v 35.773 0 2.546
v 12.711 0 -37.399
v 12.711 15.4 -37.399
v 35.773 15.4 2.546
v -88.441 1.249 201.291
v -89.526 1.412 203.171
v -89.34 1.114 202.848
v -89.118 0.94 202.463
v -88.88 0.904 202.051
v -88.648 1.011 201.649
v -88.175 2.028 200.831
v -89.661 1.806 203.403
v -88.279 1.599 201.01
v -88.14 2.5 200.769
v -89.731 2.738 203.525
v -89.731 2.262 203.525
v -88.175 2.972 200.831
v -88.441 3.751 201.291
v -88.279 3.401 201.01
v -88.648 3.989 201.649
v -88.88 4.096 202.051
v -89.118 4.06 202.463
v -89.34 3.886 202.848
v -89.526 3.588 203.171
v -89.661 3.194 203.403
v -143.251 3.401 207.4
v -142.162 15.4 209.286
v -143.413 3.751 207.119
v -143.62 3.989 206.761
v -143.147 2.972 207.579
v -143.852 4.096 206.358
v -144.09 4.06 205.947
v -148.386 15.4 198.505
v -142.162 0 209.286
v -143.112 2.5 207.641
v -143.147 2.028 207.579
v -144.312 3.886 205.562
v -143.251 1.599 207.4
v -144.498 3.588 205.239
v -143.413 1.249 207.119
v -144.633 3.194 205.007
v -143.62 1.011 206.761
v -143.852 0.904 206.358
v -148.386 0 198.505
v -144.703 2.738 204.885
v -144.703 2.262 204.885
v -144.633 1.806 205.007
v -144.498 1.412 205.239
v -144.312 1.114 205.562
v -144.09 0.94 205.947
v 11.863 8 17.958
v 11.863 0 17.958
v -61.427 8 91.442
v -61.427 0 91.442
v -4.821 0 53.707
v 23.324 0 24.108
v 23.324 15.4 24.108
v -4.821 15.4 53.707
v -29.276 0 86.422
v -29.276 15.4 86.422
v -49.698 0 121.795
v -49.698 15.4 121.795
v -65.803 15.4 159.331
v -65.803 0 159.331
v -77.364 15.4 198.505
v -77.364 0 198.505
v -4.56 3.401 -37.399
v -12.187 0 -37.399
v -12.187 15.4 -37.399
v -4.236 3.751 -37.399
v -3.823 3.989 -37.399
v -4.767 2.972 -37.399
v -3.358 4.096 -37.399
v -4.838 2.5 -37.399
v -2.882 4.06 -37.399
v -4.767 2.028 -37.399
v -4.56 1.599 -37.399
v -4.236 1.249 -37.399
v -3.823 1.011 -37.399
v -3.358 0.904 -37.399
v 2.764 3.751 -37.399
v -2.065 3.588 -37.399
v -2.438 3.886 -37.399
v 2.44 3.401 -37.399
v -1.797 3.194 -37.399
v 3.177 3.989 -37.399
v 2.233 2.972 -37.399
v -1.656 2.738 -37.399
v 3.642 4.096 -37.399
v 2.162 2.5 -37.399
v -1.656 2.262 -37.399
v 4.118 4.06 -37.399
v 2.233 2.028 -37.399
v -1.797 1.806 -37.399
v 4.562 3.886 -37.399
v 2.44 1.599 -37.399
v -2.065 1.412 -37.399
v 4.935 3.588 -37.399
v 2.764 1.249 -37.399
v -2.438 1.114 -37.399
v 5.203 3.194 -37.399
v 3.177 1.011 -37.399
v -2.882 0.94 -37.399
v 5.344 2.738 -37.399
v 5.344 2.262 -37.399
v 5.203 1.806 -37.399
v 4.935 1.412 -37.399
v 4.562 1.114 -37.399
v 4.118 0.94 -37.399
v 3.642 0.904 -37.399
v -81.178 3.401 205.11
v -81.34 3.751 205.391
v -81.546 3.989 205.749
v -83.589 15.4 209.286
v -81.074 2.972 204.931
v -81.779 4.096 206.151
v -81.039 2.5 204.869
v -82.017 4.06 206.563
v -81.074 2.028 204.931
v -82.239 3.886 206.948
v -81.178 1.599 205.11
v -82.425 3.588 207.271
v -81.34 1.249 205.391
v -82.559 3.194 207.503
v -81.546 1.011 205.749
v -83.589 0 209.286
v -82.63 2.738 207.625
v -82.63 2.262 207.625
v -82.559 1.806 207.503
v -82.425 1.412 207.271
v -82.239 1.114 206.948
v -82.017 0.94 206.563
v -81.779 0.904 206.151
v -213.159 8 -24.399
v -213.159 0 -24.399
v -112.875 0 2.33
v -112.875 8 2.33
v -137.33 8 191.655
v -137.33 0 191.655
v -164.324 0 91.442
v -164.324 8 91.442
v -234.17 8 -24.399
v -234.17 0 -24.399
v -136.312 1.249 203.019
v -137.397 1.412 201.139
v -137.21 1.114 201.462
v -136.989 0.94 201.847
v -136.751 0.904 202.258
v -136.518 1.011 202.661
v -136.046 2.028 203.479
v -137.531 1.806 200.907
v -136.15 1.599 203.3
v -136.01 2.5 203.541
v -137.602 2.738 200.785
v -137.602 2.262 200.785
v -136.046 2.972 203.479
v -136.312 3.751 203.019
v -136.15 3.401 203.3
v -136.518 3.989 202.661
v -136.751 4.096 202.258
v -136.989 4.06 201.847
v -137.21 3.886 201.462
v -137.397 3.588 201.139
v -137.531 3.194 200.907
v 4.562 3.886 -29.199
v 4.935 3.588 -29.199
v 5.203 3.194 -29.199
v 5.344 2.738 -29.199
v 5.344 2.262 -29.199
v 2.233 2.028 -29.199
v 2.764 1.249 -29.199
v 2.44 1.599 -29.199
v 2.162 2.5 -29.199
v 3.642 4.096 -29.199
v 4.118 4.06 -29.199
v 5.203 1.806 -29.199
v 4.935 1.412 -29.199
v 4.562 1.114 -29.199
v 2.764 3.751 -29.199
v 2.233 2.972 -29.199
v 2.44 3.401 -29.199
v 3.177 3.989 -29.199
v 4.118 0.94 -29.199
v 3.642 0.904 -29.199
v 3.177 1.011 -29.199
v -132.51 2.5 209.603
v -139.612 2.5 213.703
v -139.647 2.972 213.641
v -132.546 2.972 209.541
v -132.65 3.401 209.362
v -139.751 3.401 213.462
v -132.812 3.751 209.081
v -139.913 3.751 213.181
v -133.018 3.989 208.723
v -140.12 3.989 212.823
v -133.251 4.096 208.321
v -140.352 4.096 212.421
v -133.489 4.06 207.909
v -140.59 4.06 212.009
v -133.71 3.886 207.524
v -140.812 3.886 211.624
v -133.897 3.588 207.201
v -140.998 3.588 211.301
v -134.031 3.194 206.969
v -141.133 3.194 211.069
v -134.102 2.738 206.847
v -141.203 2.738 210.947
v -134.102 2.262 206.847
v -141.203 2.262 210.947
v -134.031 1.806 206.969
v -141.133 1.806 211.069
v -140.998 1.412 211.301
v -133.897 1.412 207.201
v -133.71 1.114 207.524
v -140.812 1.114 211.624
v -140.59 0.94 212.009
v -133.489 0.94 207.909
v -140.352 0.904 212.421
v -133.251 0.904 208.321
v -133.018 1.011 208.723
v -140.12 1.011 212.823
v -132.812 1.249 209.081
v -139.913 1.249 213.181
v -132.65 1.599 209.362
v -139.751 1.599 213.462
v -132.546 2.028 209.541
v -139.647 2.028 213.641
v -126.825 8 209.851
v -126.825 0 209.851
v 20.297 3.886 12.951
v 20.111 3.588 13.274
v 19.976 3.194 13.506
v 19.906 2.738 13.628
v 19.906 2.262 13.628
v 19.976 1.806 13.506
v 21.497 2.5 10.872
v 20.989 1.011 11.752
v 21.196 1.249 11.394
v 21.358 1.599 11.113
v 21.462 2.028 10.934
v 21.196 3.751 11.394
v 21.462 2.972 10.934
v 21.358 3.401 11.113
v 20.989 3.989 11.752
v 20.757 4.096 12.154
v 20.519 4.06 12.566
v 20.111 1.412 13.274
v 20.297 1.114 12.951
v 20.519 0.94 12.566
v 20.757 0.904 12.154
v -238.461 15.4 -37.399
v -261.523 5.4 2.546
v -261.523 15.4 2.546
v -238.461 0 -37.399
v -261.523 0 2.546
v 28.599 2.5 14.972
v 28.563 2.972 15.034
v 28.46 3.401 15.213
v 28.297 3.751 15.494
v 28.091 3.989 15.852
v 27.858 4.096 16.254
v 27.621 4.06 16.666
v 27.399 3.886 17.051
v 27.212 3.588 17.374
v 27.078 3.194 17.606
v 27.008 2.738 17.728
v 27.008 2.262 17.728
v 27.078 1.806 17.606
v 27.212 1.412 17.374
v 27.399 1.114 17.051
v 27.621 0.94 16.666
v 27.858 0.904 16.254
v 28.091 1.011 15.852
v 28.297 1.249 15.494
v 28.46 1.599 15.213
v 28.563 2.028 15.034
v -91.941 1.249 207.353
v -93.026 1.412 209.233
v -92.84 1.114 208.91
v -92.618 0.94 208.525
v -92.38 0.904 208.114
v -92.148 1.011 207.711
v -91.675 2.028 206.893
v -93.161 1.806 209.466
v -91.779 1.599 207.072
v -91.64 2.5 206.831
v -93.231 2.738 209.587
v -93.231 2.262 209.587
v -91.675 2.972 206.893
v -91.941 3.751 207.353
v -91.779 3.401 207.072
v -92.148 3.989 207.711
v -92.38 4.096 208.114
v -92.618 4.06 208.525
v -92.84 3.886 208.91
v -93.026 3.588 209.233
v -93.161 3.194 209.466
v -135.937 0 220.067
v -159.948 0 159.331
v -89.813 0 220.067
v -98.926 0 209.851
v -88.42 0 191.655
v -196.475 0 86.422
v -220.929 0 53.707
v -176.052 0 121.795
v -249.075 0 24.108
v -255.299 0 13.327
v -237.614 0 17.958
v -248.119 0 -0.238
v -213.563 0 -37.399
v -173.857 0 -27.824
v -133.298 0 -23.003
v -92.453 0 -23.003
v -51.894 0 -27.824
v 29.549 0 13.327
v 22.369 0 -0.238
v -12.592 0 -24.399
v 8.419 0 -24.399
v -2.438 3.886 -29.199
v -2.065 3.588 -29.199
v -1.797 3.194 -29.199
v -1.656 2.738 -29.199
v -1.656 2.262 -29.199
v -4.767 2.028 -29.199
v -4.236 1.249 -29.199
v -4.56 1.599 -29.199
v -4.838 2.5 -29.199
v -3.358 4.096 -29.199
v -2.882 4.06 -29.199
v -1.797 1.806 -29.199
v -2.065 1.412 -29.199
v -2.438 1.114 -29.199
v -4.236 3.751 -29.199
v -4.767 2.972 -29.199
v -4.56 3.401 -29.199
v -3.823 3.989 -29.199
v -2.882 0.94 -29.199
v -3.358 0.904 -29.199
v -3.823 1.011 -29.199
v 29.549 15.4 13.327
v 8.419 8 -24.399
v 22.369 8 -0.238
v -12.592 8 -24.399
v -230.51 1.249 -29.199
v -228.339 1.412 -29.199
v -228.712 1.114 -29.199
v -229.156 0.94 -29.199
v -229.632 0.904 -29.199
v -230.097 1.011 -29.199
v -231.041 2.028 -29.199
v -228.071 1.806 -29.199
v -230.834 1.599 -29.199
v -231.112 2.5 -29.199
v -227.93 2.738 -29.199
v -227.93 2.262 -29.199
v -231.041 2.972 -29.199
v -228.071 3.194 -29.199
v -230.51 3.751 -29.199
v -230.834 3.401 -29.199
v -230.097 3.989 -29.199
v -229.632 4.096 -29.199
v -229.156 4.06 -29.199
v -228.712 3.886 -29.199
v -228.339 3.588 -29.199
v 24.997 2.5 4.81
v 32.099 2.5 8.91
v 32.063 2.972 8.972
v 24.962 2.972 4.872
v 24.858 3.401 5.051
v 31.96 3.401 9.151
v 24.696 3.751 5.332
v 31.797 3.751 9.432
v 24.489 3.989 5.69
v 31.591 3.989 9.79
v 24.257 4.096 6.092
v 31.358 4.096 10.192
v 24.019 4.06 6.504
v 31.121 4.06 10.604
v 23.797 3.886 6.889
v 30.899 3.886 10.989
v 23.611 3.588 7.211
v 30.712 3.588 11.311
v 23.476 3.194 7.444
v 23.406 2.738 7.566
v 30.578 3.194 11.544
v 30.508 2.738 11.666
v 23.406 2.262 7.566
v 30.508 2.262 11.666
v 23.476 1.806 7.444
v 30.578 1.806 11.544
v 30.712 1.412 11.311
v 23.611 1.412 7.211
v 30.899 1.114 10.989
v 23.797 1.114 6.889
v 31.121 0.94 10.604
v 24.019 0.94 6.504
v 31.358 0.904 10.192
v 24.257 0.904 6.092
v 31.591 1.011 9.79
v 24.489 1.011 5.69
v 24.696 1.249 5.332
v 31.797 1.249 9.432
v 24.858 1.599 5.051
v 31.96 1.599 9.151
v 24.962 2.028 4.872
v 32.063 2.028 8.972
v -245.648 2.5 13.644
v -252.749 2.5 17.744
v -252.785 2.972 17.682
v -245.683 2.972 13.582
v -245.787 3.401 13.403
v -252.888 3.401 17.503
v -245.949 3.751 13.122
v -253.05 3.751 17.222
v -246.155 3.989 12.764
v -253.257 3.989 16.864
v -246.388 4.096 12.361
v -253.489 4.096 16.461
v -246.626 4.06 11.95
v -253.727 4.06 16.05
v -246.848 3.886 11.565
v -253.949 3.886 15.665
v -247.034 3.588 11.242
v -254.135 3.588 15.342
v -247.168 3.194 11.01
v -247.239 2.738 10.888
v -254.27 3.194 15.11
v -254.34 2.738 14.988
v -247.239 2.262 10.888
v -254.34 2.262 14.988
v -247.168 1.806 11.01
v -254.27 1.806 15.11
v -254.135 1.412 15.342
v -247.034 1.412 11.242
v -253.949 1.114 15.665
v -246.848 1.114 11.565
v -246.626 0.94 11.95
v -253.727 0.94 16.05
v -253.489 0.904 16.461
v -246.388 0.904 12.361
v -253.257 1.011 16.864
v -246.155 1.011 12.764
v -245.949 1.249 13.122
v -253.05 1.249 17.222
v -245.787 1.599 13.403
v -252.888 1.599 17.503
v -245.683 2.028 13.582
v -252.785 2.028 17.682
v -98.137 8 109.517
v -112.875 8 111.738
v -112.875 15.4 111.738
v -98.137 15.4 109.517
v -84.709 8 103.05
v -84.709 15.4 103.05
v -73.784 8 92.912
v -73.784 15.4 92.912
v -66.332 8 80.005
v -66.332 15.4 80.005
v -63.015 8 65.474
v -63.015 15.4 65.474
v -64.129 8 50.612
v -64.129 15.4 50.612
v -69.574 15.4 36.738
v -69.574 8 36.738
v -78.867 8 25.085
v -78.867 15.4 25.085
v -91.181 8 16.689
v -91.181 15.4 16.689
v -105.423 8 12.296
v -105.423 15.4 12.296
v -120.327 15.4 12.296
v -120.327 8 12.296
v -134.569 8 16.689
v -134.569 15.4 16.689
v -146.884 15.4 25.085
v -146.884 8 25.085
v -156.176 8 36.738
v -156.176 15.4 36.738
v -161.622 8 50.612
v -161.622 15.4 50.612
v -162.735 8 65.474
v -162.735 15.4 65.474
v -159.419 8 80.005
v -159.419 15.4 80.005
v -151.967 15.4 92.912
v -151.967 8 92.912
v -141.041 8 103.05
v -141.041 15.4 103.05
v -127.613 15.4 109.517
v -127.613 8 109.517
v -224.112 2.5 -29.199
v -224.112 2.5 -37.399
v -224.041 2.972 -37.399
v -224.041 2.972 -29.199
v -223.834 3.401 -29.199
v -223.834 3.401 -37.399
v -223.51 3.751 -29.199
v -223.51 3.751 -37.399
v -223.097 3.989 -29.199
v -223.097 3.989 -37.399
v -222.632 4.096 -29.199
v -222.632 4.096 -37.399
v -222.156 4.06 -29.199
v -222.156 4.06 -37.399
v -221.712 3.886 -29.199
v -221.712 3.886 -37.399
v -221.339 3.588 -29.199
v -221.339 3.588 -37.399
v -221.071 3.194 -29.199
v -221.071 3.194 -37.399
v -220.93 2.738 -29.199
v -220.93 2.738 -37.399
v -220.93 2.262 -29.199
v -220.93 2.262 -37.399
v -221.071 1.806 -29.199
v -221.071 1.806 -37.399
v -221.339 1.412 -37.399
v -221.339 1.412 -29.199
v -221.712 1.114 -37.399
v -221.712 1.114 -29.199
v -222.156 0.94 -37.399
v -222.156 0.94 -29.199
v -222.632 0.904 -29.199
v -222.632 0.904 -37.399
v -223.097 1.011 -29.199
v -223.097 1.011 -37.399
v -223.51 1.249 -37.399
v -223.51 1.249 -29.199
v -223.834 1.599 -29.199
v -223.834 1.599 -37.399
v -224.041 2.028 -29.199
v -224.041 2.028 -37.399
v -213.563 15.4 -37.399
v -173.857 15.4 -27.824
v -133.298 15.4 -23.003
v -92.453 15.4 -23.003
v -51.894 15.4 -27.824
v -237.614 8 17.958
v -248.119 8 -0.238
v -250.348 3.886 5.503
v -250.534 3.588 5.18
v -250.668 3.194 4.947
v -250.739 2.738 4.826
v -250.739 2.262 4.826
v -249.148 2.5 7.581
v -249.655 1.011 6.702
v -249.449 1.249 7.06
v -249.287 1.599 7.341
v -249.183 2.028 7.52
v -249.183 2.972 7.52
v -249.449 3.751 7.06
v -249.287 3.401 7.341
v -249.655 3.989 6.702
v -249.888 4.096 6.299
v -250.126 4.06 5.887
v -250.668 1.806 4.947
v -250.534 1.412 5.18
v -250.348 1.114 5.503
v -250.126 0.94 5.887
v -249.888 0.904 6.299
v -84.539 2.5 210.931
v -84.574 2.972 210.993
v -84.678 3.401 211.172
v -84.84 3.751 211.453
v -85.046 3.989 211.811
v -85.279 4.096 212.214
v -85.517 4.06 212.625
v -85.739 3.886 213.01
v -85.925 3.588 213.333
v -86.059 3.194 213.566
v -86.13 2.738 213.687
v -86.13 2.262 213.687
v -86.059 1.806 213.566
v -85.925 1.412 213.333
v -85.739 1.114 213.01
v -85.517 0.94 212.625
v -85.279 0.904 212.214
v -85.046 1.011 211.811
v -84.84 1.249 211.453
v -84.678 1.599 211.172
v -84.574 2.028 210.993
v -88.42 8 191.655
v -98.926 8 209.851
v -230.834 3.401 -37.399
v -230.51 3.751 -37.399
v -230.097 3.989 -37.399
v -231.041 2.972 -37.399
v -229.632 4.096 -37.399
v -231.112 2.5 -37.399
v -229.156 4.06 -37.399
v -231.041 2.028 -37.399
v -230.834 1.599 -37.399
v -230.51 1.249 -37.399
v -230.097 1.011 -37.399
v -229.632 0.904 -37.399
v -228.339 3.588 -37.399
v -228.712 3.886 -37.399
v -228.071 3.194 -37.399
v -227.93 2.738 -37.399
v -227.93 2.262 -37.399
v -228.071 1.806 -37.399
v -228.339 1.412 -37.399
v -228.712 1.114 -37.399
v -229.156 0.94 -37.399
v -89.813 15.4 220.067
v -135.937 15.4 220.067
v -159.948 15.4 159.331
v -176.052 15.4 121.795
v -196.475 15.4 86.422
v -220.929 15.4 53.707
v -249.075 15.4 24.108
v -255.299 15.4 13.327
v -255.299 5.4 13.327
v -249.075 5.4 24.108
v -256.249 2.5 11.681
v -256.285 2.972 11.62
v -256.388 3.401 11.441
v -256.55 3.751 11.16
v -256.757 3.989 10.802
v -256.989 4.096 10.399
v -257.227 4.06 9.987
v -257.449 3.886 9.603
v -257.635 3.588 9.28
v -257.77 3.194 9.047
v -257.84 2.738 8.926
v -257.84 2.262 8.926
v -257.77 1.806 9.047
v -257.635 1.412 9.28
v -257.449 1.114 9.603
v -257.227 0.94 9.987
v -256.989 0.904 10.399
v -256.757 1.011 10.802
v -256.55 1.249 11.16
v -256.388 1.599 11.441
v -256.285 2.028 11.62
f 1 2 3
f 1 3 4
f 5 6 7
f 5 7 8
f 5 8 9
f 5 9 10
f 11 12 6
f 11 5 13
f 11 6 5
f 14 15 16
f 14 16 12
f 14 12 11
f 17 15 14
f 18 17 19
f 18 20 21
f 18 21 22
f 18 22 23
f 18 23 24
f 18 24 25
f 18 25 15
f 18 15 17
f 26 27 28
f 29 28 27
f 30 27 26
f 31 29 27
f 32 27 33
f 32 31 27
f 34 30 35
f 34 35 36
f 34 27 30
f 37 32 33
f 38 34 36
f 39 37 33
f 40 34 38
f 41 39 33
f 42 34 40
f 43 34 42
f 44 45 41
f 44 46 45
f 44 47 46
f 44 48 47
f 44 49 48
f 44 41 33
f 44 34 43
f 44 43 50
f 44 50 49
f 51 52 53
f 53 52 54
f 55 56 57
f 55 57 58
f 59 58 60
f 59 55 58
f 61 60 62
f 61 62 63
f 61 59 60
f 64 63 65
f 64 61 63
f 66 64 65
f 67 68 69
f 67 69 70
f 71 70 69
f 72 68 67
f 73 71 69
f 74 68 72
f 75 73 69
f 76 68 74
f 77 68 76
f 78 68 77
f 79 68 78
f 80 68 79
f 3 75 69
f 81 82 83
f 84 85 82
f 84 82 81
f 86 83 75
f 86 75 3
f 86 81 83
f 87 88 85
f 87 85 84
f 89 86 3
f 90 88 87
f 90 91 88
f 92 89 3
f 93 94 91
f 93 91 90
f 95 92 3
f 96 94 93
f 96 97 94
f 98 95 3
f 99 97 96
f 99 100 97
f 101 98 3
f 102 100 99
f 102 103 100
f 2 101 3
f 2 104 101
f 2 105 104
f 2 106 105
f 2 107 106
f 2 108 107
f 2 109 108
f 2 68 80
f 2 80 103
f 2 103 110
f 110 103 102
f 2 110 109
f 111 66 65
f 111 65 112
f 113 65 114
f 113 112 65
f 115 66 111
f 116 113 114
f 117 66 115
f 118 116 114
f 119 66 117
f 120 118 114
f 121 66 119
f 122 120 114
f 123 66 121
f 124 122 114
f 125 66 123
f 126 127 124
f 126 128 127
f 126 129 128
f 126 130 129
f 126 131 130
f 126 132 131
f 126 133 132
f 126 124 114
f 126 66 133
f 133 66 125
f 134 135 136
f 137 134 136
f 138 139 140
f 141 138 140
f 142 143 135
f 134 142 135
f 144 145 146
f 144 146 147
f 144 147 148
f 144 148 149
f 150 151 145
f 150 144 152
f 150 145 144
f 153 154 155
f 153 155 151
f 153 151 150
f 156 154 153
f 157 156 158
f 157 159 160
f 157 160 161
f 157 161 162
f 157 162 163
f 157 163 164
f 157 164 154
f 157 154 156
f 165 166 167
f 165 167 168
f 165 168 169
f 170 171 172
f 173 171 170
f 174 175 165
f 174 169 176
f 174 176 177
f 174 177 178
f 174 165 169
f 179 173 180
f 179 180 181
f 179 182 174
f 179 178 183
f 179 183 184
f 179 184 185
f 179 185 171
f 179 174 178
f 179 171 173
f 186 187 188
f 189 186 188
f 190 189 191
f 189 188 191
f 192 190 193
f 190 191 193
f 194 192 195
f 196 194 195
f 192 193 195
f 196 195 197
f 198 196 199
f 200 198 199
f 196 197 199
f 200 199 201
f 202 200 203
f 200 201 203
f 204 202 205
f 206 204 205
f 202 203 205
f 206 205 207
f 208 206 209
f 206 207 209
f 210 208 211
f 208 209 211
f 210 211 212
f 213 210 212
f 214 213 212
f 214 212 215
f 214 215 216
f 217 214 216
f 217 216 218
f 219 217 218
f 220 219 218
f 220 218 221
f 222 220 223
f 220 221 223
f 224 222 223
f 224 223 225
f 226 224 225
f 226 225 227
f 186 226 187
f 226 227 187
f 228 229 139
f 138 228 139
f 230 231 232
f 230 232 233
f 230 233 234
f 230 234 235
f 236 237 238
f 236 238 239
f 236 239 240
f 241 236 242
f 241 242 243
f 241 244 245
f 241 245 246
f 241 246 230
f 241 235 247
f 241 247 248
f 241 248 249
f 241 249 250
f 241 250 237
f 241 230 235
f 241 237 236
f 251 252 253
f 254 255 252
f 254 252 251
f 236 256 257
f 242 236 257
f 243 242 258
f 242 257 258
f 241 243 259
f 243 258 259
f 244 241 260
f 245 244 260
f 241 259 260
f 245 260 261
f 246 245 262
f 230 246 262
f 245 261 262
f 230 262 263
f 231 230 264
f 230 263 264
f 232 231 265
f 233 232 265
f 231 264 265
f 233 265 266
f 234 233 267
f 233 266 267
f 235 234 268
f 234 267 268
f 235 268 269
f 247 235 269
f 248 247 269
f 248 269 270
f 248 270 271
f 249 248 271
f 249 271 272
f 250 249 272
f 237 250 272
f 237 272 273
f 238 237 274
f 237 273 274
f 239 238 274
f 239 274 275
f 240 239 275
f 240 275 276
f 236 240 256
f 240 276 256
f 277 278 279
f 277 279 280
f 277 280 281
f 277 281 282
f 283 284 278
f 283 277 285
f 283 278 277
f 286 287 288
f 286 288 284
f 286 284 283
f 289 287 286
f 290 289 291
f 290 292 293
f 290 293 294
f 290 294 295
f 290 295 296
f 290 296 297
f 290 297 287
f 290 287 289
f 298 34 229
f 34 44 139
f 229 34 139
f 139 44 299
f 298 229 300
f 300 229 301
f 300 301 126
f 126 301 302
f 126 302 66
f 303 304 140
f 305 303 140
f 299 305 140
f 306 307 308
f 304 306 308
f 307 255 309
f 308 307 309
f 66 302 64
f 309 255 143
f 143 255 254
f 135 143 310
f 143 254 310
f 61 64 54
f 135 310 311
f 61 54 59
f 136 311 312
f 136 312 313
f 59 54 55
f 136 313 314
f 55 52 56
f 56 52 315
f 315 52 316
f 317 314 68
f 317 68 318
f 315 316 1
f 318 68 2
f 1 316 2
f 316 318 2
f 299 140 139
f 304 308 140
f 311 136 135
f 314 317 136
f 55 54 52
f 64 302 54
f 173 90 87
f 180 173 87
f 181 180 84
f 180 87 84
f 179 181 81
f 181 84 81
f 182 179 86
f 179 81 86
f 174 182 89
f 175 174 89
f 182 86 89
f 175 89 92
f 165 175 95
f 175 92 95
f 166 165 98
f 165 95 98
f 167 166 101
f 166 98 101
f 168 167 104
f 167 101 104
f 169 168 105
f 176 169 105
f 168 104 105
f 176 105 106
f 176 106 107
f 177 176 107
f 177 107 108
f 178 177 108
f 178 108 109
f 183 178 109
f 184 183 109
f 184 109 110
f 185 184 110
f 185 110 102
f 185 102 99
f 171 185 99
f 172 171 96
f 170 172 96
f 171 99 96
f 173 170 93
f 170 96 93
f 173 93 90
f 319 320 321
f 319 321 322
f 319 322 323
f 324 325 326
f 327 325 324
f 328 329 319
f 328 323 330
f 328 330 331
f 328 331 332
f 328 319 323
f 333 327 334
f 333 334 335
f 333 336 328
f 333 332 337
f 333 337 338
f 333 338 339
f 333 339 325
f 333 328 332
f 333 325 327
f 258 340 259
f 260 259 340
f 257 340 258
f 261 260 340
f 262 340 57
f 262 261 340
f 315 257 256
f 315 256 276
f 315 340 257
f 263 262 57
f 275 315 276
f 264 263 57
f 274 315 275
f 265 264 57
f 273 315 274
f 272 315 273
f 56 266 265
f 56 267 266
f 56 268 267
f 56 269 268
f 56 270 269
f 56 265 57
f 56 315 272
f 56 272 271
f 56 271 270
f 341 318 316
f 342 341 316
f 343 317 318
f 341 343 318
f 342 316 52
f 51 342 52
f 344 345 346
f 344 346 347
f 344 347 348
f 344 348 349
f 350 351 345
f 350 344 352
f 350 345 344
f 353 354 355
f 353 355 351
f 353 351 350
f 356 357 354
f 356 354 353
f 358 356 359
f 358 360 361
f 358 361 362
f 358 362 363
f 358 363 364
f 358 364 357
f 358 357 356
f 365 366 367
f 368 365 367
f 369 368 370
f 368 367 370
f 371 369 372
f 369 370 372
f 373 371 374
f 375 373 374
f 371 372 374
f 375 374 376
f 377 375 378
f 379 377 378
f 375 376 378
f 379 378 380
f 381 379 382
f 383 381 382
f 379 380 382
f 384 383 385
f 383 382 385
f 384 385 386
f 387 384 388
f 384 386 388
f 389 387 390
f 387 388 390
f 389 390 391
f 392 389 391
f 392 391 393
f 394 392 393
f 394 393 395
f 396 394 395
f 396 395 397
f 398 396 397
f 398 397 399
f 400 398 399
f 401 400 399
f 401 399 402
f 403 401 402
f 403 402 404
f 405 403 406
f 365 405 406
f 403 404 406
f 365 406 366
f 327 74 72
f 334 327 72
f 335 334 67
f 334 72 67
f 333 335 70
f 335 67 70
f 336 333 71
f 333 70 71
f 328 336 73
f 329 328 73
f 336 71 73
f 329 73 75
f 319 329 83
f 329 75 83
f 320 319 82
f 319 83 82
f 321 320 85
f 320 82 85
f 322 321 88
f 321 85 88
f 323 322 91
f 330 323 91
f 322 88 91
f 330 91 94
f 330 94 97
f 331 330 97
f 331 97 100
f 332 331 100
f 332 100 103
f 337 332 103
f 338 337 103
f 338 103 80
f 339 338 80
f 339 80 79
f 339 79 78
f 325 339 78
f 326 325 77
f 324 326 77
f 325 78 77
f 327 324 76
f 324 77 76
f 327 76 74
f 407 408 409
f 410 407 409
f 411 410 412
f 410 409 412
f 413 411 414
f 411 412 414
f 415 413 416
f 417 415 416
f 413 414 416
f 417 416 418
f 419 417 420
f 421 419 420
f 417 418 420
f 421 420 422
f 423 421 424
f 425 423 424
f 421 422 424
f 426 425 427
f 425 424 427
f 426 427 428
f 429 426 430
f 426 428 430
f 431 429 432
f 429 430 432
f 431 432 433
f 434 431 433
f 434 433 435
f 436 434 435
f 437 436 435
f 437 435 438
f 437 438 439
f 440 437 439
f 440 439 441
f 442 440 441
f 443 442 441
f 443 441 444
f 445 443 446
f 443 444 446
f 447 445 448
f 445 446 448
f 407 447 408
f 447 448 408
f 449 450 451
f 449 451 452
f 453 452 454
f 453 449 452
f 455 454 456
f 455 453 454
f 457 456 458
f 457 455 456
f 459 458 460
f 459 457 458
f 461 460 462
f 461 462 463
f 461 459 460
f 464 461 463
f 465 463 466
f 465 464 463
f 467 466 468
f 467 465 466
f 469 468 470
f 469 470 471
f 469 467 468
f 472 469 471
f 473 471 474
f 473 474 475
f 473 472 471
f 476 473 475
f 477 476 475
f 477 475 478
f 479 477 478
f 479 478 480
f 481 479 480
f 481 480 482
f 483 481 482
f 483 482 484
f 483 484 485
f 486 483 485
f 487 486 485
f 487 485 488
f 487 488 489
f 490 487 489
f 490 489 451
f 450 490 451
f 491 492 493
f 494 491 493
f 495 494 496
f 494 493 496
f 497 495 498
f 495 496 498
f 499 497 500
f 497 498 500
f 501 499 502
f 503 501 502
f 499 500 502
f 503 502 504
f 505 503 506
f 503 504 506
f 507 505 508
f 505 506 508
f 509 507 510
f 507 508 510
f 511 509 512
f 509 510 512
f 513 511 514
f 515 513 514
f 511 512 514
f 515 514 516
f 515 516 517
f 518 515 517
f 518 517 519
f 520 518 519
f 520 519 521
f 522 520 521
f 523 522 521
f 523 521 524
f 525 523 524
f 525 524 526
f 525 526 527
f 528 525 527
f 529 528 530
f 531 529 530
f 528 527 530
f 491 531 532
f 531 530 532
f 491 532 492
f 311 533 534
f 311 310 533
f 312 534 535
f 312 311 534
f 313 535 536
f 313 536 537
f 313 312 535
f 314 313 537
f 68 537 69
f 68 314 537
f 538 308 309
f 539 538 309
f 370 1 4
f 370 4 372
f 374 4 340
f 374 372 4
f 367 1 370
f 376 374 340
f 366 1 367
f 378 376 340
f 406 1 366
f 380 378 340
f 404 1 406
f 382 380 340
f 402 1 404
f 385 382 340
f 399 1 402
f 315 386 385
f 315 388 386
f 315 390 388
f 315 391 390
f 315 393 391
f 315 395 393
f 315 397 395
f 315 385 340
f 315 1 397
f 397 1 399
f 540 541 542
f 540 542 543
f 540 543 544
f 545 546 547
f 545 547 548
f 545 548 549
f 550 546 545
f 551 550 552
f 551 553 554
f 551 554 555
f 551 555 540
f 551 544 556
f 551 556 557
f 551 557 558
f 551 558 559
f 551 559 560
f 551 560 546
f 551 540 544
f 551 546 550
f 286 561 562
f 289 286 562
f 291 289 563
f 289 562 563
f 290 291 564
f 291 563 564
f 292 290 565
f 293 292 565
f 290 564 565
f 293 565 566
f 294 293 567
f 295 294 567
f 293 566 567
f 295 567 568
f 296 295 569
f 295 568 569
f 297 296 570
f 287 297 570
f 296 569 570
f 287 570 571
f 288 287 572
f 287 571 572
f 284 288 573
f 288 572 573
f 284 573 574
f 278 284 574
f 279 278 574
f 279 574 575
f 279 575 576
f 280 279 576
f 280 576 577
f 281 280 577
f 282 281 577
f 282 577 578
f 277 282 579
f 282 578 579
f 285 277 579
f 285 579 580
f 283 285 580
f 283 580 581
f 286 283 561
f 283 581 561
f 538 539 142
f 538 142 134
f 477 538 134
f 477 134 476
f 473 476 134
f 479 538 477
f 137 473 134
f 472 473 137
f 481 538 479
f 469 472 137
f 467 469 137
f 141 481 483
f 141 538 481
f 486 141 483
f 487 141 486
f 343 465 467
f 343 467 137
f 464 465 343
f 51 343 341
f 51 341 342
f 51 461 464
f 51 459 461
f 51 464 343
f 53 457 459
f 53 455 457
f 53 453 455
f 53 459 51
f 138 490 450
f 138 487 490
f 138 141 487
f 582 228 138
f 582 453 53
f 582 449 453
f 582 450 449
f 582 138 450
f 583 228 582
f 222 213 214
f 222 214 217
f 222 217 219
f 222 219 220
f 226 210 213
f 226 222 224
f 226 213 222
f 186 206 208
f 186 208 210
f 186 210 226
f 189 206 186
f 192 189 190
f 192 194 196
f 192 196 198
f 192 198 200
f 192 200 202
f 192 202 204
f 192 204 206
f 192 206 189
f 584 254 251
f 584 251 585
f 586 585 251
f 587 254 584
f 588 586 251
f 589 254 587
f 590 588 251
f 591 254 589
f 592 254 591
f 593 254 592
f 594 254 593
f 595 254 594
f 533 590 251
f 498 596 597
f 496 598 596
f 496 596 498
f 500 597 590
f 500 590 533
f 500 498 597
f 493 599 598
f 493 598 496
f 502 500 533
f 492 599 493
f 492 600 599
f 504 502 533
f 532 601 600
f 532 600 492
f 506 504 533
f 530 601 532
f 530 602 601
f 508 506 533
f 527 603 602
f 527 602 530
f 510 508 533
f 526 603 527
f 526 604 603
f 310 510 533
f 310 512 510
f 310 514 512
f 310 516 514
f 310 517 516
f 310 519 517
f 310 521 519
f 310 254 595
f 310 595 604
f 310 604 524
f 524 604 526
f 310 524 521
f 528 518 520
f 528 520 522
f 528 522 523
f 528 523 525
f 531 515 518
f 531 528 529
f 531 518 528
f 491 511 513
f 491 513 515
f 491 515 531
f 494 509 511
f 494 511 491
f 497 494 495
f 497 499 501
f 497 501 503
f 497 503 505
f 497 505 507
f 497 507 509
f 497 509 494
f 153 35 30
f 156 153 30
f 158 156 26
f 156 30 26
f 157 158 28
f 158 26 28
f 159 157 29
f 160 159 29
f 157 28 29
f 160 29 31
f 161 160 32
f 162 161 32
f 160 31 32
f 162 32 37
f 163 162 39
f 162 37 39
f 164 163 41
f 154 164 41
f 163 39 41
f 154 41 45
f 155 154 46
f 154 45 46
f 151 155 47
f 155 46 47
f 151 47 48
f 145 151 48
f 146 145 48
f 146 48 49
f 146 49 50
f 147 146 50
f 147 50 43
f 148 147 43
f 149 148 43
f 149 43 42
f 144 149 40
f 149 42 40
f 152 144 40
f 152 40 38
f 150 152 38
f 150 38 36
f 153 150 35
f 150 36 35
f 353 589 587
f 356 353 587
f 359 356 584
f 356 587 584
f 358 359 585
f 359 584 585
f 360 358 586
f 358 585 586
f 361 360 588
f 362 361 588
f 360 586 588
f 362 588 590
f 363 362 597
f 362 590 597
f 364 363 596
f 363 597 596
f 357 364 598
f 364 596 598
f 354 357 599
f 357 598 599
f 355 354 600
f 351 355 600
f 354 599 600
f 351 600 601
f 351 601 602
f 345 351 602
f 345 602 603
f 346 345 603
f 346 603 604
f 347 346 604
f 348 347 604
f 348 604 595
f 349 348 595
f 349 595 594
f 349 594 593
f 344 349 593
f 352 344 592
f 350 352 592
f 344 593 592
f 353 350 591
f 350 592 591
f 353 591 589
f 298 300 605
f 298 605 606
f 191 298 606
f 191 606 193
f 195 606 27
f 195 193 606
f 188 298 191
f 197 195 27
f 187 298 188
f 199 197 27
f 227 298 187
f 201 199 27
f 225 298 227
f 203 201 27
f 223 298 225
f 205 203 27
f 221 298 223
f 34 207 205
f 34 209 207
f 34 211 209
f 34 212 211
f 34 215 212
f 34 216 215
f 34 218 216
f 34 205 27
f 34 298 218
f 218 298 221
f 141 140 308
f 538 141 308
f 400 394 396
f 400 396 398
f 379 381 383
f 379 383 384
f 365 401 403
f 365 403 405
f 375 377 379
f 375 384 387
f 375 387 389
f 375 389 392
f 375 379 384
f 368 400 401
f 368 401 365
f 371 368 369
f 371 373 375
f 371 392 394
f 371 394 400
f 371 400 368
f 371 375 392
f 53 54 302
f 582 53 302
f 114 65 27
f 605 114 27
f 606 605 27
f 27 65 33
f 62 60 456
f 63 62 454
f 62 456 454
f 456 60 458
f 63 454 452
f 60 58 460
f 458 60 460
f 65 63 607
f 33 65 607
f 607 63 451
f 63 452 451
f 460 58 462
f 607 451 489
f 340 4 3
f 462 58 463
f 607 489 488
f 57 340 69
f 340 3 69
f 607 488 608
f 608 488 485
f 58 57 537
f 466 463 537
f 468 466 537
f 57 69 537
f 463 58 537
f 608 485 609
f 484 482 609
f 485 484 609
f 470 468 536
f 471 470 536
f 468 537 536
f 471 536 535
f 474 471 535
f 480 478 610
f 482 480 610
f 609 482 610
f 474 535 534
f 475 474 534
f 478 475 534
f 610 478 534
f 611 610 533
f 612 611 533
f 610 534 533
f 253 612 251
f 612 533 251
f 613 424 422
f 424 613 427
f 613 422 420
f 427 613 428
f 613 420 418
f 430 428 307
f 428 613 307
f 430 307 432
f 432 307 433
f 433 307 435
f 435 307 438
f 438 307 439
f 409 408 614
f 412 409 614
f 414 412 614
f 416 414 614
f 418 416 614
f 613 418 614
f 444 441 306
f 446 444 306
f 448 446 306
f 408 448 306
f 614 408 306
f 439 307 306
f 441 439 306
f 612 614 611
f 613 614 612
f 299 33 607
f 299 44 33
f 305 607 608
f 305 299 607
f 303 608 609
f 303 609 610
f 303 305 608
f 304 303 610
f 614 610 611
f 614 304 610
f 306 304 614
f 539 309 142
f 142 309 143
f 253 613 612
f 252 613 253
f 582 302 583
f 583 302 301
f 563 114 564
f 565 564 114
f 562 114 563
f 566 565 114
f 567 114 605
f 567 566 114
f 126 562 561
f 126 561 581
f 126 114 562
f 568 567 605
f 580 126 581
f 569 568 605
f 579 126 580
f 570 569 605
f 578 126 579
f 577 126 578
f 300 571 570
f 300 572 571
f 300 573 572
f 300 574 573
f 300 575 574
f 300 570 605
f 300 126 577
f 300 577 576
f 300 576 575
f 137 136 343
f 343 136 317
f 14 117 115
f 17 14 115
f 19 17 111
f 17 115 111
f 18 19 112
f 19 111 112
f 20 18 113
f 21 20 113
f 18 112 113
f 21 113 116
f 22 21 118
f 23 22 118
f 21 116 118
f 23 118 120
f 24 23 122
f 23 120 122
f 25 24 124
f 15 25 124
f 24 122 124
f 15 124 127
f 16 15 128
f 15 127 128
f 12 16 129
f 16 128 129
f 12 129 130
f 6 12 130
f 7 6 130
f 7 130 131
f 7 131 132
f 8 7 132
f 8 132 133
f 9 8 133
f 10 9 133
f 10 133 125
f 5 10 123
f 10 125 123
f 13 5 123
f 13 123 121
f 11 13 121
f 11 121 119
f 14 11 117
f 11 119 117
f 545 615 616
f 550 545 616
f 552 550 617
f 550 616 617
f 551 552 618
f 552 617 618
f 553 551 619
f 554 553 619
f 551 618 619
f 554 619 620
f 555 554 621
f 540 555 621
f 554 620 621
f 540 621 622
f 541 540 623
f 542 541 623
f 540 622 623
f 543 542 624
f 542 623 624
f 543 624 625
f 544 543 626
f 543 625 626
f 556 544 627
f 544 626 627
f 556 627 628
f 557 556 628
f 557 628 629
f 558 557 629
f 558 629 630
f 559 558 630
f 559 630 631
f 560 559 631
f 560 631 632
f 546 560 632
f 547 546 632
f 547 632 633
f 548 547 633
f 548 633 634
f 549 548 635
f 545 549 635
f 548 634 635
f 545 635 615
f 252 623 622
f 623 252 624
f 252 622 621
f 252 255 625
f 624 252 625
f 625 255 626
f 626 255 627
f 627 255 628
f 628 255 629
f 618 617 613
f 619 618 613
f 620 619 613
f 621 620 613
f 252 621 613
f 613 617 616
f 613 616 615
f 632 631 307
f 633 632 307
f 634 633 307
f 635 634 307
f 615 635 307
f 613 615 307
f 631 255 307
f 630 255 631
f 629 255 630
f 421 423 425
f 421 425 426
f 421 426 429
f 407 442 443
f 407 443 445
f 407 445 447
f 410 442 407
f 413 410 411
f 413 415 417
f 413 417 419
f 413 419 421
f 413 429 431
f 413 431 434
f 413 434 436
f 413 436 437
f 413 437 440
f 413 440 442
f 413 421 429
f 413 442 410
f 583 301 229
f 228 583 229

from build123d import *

# Parameters (mm, degrees)
BOSS_EXTRUDE2_DEPTH = 5.4
SKETCH24_R          = 50
CUT_EXTRUDE1_DEPTH  = 342.837952203
SKETCH26_R          = 1.6
CUT_EXTRUDE2_DEPTH  = 8.2
SKETCH27_R          = 1.6
CUT_EXTRUDE3_DEPTH  = 8.2
SKETCH28_R          = 1.6
CUT_EXTRUDE4_DEPTH  = 8.2
SKETCH29_R          = 1.6
CUT_EXTRUDE5_DEPTH  = 8.2
SKETCH30_R          = 1.6
CUT_EXTRUDE6_DEPTH  = 8.2
SKETCH31_R          = 1.6
CUT_EXTRUDE7_DEPTH  = 8.2
SKETCH32_R          = 50
BOSS_EXTRUDE3_DEPTH = 10
CUT_EXTRUDE10_DEPTH = 8


with BuildPart() as part:
    # Sketch1 → Boss-Extrude2 (new body)
    with BuildSketch(Plane(origin=(0, 0, 0), x_dir=(1, 0, 0), z_dir=(0, 1, 0))):
        with BuildLine():
            Line((-213.563400388, 37.399198664), (-226.012295427, 37.399198664))
            Line((-226.012295427, 37.399198664), (-238.461190465, 37.399198664))
            Line((-238.461190465, 37.399198664), (-261.523434509, -2.545779757))
            Line((-261.523434509, -2.545779757), (-255.29898699, -13.326839109))
            Line((-255.29898699, -13.326839109), (-249.074539471, -24.107898462))
            ThreePointArc((-249.074539471, -24.107898462), (-185.740063438, -103.806428821), (-148.38634952, -198.50495918))
            Line((-148.38634952, -198.50495918), (-142.161902, -209.286018532))
            Line((-142.161902, -209.286018532), (-135.937454481, -220.067077885))
            Line((-135.937454481, -220.067077885), (-89.812966393, -220.067077885))
            Line((-89.812966393, -220.067077885), (-83.588518873, -209.286018532))
            Line((-83.588518873, -209.286018532), (-77.364071354, -198.50495918))
            ThreePointArc((-77.364071354, -198.50495918), (-40.010357435, -103.806428821), (23.324118597, -24.107898462))
            Line((23.324118597, -24.107898462), (29.548566116, -13.326839109))
            Line((29.548566116, -13.326839109), (35.773013636, -2.545779757))
            Line((35.773013636, -2.545779757), (12.710769592, 37.399198664))
            Line((12.710769592, 37.399198664), (0.261874553, 37.399198664))
            Line((0.261874553, 37.399198664), (-12.187020486, 37.399198664))
            ThreePointArc((-12.187020486, 37.399198664), (-112.875210437, 22.399198664), (-213.563400388, 37.399198664))
        make_face()
    extrude(amount=BOSS_EXTRUDE2_DEPTH)

    # Sketch24 → Cut-Extrude1 (cut, through all)
    with BuildSketch(Plane(origin=(0, 5.4, 0), x_dir=(1, 0, 0), z_dir=(0, 1, 0))):
        with Locations(Location((-112.875210437, -61.737886326, 0), (0, 0, 270))):
            Circle(SKETCH24_R)
    extrude(amount=-CUT_EXTRUDE1_DEPTH, mode=Mode.SUBTRACT)

    # Sketch26 → Cut-Extrude2 (cut)
    with BuildSketch(Plane(origin=(-197.244930853, 0, 113.879413924), x_dir=(0.5000000000000135, 0, 0.8660254037844309), z_dir=(-0.8660254037844309, 0, 0.5000000000000135))):
        with Locations((106.666057706, 2.5)):
            Circle(SKETCH26_R)
        with Locations((113.666057706, 2.5)):
            Circle(SKETCH26_R)
    extrude(amount=-CUT_EXTRUDE2_DEPTH, mode=Mode.SUBTRACT)

    # Sketch27 → Cut-Extrude3 (cut)
    with BuildSketch(Plane(origin=(-197.244930853, 0, 113.879413924), x_dir=(0.5000000000000427, 0, 0.8660254037844141), z_dir=(-0.8660254037844141, 0, 0.5000000000000427))):
        with Locations((-119.608112274, 2.5)):
            Circle(SKETCH27_R)
        with Locations((-112.608112274, 2.5)):
            Circle(SKETCH27_R)
    extrude(amount=-CUT_EXTRUDE3_DEPTH, mode=Mode.SUBTRACT)

    # Sketch28 → Cut-Extrude4 (cut)
    with BuildSketch(Plane(origin=(0, 0, -37.399198664), x_dir=(-1, 0, 0), z_dir=(0, 0, -1))):
        with Locations((222.512295427, 2.5)):
            Circle(SKETCH28_R)
        with Locations((229.512295427, 2.5)):
            Circle(SKETCH28_R)
    extrude(amount=-CUT_EXTRUDE4_DEPTH, mode=Mode.SUBTRACT)

    # Sketch29 → Cut-Extrude5 (cut)
    with BuildSketch(Plane(origin=(0, 0, -37.399198664), x_dir=(-1, 0, 0), z_dir=(0, 0, -1))):
        with Locations((-3.761874553, 2.5)):
            Circle(SKETCH29_R)
        with Locations((3.238125447, 2.5)):
            Circle(SKETCH29_R)
    extrude(amount=-CUT_EXTRUDE5_DEPTH, mode=Mode.SUBTRACT)

    # Sketch30 → Cut-Extrude6 (cut)
    with BuildSketch(Plane(origin=(27.932115198, 0, 16.126614228), x_dir=(0.5000000000001847, 0, -0.8660254037843321), z_dir=(0.866025403784332, 0, 0.5000000000001846))):
        with Locations((-0.267098163, 2.5)):
            Circle(SKETCH30_R)
        with Locations((6.732901837, 2.5)):
            Circle(SKETCH30_R)
    extrude(amount=-CUT_EXTRUDE6_DEPTH, mode=Mode.SUBTRACT)

    # Sketch31 → Cut-Extrude7 (cut)
    with BuildSketch(Plane(origin=(27.932115198, 0, 16.126614228), x_dir=(0.5000000000000033, 0, -0.8660254037844368), z_dir=(0.8660254037844367, 0, 0.5000000000000032))):
        with Locations((-226.541268142, 2.5)):
            Circle(SKETCH31_R)
        with Locations((-219.541268142, 2.5)):
            Circle(SKETCH31_R)
    extrude(amount=-CUT_EXTRUDE7_DEPTH, mode=Mode.SUBTRACT)

    # Sketch32 → Boss-Extrude3 (add)
    with BuildSketch(Plane(origin=(0, 5.4, 0), x_dir=(1, 0, 0), z_dir=(0, 1, 0))):
        with BuildLine():
            Line((-226.012295427, 37.399198664), (-213.563400388, 37.399198664))
            ThreePointArc((-213.563400388, 37.399198664), (-112.875210437, 22.399198664), (-12.187020486, 37.399198664))
            Line((-12.187020486, 37.399198664), (0.261874553, 37.399198664))
            Line((0.261874553, 37.399198664), (12.710769592, 37.399198664))
            Line((12.710769592, 37.399198664), (35.773013636, -2.545779757))
            Line((35.773013636, -2.545779757), (29.548566116, -13.326839109))
            Line((29.548566116, -13.326839109), (23.324118597, -24.107898462))
            ThreePointArc((23.324118597, -24.107898462), (-40.010357435, -103.806428821), (-77.364071354, -198.50495918))
            Line((-77.364071354, -198.50495918), (-83.588518873, -209.286018532))
            Line((-83.588518873, -209.286018532), (-89.812966393, -220.067077885))
            Line((-89.812966393, -220.067077885), (-135.937454481, -220.067077885))
            Line((-135.937454481, -220.067077885), (-142.161902, -209.286018532))
            Line((-142.161902, -209.286018532), (-148.38634952, -198.50495918))
            ThreePointArc((-148.38634952, -198.50495918), (-185.740063438, -103.806428821), (-249.074539471, -24.107898462))
            Line((-249.074539471, -24.107898462), (-255.29898699, -13.32683911))
            Line((-255.29898699, -13.32683911), (-261.523434509, -2.545779757))
            Line((-261.523434509, -2.545779757), (-238.461190465, 37.399198664))
            Line((-238.461190465, 37.399198664), (-226.012295427, 37.399198664))
        make_face()
        with Locations(Location((-112.875210437, -61.737886326, 0), (0, 0, 270))):
            Circle(SKETCH32_R, mode=Mode.SUBTRACT)
    extrude(amount=BOSS_EXTRUDE3_DEPTH)

    # Sketch36 → Cut-Extrude10 (cut)
    with BuildSketch(Plane.XZ):
        Polygon((-126.824859873, 209.850554734), (-137.330315468, 191.654571888), (-164.323687679, 91.441678511), (-237.613913024, 17.958285754), (-248.119368619, -0.237697092), (-234.169719182, -24.399198664), (-213.158807994, -24.399198664), (-112.875210437, 2.330301956), (-12.59161288, -24.399198664), (8.419298308, -24.399198664), (22.368947745, -0.237697092), (11.863492151, 17.958285754), (-61.426733195, 91.441678511), (-88.420105406, 191.654571888), (-98.925561, 209.850554734), align=None)
    extrude(amount=-CUT_EXTRUDE10_DEPTH, mode=Mode.SUBTRACT)


solid = part.part
